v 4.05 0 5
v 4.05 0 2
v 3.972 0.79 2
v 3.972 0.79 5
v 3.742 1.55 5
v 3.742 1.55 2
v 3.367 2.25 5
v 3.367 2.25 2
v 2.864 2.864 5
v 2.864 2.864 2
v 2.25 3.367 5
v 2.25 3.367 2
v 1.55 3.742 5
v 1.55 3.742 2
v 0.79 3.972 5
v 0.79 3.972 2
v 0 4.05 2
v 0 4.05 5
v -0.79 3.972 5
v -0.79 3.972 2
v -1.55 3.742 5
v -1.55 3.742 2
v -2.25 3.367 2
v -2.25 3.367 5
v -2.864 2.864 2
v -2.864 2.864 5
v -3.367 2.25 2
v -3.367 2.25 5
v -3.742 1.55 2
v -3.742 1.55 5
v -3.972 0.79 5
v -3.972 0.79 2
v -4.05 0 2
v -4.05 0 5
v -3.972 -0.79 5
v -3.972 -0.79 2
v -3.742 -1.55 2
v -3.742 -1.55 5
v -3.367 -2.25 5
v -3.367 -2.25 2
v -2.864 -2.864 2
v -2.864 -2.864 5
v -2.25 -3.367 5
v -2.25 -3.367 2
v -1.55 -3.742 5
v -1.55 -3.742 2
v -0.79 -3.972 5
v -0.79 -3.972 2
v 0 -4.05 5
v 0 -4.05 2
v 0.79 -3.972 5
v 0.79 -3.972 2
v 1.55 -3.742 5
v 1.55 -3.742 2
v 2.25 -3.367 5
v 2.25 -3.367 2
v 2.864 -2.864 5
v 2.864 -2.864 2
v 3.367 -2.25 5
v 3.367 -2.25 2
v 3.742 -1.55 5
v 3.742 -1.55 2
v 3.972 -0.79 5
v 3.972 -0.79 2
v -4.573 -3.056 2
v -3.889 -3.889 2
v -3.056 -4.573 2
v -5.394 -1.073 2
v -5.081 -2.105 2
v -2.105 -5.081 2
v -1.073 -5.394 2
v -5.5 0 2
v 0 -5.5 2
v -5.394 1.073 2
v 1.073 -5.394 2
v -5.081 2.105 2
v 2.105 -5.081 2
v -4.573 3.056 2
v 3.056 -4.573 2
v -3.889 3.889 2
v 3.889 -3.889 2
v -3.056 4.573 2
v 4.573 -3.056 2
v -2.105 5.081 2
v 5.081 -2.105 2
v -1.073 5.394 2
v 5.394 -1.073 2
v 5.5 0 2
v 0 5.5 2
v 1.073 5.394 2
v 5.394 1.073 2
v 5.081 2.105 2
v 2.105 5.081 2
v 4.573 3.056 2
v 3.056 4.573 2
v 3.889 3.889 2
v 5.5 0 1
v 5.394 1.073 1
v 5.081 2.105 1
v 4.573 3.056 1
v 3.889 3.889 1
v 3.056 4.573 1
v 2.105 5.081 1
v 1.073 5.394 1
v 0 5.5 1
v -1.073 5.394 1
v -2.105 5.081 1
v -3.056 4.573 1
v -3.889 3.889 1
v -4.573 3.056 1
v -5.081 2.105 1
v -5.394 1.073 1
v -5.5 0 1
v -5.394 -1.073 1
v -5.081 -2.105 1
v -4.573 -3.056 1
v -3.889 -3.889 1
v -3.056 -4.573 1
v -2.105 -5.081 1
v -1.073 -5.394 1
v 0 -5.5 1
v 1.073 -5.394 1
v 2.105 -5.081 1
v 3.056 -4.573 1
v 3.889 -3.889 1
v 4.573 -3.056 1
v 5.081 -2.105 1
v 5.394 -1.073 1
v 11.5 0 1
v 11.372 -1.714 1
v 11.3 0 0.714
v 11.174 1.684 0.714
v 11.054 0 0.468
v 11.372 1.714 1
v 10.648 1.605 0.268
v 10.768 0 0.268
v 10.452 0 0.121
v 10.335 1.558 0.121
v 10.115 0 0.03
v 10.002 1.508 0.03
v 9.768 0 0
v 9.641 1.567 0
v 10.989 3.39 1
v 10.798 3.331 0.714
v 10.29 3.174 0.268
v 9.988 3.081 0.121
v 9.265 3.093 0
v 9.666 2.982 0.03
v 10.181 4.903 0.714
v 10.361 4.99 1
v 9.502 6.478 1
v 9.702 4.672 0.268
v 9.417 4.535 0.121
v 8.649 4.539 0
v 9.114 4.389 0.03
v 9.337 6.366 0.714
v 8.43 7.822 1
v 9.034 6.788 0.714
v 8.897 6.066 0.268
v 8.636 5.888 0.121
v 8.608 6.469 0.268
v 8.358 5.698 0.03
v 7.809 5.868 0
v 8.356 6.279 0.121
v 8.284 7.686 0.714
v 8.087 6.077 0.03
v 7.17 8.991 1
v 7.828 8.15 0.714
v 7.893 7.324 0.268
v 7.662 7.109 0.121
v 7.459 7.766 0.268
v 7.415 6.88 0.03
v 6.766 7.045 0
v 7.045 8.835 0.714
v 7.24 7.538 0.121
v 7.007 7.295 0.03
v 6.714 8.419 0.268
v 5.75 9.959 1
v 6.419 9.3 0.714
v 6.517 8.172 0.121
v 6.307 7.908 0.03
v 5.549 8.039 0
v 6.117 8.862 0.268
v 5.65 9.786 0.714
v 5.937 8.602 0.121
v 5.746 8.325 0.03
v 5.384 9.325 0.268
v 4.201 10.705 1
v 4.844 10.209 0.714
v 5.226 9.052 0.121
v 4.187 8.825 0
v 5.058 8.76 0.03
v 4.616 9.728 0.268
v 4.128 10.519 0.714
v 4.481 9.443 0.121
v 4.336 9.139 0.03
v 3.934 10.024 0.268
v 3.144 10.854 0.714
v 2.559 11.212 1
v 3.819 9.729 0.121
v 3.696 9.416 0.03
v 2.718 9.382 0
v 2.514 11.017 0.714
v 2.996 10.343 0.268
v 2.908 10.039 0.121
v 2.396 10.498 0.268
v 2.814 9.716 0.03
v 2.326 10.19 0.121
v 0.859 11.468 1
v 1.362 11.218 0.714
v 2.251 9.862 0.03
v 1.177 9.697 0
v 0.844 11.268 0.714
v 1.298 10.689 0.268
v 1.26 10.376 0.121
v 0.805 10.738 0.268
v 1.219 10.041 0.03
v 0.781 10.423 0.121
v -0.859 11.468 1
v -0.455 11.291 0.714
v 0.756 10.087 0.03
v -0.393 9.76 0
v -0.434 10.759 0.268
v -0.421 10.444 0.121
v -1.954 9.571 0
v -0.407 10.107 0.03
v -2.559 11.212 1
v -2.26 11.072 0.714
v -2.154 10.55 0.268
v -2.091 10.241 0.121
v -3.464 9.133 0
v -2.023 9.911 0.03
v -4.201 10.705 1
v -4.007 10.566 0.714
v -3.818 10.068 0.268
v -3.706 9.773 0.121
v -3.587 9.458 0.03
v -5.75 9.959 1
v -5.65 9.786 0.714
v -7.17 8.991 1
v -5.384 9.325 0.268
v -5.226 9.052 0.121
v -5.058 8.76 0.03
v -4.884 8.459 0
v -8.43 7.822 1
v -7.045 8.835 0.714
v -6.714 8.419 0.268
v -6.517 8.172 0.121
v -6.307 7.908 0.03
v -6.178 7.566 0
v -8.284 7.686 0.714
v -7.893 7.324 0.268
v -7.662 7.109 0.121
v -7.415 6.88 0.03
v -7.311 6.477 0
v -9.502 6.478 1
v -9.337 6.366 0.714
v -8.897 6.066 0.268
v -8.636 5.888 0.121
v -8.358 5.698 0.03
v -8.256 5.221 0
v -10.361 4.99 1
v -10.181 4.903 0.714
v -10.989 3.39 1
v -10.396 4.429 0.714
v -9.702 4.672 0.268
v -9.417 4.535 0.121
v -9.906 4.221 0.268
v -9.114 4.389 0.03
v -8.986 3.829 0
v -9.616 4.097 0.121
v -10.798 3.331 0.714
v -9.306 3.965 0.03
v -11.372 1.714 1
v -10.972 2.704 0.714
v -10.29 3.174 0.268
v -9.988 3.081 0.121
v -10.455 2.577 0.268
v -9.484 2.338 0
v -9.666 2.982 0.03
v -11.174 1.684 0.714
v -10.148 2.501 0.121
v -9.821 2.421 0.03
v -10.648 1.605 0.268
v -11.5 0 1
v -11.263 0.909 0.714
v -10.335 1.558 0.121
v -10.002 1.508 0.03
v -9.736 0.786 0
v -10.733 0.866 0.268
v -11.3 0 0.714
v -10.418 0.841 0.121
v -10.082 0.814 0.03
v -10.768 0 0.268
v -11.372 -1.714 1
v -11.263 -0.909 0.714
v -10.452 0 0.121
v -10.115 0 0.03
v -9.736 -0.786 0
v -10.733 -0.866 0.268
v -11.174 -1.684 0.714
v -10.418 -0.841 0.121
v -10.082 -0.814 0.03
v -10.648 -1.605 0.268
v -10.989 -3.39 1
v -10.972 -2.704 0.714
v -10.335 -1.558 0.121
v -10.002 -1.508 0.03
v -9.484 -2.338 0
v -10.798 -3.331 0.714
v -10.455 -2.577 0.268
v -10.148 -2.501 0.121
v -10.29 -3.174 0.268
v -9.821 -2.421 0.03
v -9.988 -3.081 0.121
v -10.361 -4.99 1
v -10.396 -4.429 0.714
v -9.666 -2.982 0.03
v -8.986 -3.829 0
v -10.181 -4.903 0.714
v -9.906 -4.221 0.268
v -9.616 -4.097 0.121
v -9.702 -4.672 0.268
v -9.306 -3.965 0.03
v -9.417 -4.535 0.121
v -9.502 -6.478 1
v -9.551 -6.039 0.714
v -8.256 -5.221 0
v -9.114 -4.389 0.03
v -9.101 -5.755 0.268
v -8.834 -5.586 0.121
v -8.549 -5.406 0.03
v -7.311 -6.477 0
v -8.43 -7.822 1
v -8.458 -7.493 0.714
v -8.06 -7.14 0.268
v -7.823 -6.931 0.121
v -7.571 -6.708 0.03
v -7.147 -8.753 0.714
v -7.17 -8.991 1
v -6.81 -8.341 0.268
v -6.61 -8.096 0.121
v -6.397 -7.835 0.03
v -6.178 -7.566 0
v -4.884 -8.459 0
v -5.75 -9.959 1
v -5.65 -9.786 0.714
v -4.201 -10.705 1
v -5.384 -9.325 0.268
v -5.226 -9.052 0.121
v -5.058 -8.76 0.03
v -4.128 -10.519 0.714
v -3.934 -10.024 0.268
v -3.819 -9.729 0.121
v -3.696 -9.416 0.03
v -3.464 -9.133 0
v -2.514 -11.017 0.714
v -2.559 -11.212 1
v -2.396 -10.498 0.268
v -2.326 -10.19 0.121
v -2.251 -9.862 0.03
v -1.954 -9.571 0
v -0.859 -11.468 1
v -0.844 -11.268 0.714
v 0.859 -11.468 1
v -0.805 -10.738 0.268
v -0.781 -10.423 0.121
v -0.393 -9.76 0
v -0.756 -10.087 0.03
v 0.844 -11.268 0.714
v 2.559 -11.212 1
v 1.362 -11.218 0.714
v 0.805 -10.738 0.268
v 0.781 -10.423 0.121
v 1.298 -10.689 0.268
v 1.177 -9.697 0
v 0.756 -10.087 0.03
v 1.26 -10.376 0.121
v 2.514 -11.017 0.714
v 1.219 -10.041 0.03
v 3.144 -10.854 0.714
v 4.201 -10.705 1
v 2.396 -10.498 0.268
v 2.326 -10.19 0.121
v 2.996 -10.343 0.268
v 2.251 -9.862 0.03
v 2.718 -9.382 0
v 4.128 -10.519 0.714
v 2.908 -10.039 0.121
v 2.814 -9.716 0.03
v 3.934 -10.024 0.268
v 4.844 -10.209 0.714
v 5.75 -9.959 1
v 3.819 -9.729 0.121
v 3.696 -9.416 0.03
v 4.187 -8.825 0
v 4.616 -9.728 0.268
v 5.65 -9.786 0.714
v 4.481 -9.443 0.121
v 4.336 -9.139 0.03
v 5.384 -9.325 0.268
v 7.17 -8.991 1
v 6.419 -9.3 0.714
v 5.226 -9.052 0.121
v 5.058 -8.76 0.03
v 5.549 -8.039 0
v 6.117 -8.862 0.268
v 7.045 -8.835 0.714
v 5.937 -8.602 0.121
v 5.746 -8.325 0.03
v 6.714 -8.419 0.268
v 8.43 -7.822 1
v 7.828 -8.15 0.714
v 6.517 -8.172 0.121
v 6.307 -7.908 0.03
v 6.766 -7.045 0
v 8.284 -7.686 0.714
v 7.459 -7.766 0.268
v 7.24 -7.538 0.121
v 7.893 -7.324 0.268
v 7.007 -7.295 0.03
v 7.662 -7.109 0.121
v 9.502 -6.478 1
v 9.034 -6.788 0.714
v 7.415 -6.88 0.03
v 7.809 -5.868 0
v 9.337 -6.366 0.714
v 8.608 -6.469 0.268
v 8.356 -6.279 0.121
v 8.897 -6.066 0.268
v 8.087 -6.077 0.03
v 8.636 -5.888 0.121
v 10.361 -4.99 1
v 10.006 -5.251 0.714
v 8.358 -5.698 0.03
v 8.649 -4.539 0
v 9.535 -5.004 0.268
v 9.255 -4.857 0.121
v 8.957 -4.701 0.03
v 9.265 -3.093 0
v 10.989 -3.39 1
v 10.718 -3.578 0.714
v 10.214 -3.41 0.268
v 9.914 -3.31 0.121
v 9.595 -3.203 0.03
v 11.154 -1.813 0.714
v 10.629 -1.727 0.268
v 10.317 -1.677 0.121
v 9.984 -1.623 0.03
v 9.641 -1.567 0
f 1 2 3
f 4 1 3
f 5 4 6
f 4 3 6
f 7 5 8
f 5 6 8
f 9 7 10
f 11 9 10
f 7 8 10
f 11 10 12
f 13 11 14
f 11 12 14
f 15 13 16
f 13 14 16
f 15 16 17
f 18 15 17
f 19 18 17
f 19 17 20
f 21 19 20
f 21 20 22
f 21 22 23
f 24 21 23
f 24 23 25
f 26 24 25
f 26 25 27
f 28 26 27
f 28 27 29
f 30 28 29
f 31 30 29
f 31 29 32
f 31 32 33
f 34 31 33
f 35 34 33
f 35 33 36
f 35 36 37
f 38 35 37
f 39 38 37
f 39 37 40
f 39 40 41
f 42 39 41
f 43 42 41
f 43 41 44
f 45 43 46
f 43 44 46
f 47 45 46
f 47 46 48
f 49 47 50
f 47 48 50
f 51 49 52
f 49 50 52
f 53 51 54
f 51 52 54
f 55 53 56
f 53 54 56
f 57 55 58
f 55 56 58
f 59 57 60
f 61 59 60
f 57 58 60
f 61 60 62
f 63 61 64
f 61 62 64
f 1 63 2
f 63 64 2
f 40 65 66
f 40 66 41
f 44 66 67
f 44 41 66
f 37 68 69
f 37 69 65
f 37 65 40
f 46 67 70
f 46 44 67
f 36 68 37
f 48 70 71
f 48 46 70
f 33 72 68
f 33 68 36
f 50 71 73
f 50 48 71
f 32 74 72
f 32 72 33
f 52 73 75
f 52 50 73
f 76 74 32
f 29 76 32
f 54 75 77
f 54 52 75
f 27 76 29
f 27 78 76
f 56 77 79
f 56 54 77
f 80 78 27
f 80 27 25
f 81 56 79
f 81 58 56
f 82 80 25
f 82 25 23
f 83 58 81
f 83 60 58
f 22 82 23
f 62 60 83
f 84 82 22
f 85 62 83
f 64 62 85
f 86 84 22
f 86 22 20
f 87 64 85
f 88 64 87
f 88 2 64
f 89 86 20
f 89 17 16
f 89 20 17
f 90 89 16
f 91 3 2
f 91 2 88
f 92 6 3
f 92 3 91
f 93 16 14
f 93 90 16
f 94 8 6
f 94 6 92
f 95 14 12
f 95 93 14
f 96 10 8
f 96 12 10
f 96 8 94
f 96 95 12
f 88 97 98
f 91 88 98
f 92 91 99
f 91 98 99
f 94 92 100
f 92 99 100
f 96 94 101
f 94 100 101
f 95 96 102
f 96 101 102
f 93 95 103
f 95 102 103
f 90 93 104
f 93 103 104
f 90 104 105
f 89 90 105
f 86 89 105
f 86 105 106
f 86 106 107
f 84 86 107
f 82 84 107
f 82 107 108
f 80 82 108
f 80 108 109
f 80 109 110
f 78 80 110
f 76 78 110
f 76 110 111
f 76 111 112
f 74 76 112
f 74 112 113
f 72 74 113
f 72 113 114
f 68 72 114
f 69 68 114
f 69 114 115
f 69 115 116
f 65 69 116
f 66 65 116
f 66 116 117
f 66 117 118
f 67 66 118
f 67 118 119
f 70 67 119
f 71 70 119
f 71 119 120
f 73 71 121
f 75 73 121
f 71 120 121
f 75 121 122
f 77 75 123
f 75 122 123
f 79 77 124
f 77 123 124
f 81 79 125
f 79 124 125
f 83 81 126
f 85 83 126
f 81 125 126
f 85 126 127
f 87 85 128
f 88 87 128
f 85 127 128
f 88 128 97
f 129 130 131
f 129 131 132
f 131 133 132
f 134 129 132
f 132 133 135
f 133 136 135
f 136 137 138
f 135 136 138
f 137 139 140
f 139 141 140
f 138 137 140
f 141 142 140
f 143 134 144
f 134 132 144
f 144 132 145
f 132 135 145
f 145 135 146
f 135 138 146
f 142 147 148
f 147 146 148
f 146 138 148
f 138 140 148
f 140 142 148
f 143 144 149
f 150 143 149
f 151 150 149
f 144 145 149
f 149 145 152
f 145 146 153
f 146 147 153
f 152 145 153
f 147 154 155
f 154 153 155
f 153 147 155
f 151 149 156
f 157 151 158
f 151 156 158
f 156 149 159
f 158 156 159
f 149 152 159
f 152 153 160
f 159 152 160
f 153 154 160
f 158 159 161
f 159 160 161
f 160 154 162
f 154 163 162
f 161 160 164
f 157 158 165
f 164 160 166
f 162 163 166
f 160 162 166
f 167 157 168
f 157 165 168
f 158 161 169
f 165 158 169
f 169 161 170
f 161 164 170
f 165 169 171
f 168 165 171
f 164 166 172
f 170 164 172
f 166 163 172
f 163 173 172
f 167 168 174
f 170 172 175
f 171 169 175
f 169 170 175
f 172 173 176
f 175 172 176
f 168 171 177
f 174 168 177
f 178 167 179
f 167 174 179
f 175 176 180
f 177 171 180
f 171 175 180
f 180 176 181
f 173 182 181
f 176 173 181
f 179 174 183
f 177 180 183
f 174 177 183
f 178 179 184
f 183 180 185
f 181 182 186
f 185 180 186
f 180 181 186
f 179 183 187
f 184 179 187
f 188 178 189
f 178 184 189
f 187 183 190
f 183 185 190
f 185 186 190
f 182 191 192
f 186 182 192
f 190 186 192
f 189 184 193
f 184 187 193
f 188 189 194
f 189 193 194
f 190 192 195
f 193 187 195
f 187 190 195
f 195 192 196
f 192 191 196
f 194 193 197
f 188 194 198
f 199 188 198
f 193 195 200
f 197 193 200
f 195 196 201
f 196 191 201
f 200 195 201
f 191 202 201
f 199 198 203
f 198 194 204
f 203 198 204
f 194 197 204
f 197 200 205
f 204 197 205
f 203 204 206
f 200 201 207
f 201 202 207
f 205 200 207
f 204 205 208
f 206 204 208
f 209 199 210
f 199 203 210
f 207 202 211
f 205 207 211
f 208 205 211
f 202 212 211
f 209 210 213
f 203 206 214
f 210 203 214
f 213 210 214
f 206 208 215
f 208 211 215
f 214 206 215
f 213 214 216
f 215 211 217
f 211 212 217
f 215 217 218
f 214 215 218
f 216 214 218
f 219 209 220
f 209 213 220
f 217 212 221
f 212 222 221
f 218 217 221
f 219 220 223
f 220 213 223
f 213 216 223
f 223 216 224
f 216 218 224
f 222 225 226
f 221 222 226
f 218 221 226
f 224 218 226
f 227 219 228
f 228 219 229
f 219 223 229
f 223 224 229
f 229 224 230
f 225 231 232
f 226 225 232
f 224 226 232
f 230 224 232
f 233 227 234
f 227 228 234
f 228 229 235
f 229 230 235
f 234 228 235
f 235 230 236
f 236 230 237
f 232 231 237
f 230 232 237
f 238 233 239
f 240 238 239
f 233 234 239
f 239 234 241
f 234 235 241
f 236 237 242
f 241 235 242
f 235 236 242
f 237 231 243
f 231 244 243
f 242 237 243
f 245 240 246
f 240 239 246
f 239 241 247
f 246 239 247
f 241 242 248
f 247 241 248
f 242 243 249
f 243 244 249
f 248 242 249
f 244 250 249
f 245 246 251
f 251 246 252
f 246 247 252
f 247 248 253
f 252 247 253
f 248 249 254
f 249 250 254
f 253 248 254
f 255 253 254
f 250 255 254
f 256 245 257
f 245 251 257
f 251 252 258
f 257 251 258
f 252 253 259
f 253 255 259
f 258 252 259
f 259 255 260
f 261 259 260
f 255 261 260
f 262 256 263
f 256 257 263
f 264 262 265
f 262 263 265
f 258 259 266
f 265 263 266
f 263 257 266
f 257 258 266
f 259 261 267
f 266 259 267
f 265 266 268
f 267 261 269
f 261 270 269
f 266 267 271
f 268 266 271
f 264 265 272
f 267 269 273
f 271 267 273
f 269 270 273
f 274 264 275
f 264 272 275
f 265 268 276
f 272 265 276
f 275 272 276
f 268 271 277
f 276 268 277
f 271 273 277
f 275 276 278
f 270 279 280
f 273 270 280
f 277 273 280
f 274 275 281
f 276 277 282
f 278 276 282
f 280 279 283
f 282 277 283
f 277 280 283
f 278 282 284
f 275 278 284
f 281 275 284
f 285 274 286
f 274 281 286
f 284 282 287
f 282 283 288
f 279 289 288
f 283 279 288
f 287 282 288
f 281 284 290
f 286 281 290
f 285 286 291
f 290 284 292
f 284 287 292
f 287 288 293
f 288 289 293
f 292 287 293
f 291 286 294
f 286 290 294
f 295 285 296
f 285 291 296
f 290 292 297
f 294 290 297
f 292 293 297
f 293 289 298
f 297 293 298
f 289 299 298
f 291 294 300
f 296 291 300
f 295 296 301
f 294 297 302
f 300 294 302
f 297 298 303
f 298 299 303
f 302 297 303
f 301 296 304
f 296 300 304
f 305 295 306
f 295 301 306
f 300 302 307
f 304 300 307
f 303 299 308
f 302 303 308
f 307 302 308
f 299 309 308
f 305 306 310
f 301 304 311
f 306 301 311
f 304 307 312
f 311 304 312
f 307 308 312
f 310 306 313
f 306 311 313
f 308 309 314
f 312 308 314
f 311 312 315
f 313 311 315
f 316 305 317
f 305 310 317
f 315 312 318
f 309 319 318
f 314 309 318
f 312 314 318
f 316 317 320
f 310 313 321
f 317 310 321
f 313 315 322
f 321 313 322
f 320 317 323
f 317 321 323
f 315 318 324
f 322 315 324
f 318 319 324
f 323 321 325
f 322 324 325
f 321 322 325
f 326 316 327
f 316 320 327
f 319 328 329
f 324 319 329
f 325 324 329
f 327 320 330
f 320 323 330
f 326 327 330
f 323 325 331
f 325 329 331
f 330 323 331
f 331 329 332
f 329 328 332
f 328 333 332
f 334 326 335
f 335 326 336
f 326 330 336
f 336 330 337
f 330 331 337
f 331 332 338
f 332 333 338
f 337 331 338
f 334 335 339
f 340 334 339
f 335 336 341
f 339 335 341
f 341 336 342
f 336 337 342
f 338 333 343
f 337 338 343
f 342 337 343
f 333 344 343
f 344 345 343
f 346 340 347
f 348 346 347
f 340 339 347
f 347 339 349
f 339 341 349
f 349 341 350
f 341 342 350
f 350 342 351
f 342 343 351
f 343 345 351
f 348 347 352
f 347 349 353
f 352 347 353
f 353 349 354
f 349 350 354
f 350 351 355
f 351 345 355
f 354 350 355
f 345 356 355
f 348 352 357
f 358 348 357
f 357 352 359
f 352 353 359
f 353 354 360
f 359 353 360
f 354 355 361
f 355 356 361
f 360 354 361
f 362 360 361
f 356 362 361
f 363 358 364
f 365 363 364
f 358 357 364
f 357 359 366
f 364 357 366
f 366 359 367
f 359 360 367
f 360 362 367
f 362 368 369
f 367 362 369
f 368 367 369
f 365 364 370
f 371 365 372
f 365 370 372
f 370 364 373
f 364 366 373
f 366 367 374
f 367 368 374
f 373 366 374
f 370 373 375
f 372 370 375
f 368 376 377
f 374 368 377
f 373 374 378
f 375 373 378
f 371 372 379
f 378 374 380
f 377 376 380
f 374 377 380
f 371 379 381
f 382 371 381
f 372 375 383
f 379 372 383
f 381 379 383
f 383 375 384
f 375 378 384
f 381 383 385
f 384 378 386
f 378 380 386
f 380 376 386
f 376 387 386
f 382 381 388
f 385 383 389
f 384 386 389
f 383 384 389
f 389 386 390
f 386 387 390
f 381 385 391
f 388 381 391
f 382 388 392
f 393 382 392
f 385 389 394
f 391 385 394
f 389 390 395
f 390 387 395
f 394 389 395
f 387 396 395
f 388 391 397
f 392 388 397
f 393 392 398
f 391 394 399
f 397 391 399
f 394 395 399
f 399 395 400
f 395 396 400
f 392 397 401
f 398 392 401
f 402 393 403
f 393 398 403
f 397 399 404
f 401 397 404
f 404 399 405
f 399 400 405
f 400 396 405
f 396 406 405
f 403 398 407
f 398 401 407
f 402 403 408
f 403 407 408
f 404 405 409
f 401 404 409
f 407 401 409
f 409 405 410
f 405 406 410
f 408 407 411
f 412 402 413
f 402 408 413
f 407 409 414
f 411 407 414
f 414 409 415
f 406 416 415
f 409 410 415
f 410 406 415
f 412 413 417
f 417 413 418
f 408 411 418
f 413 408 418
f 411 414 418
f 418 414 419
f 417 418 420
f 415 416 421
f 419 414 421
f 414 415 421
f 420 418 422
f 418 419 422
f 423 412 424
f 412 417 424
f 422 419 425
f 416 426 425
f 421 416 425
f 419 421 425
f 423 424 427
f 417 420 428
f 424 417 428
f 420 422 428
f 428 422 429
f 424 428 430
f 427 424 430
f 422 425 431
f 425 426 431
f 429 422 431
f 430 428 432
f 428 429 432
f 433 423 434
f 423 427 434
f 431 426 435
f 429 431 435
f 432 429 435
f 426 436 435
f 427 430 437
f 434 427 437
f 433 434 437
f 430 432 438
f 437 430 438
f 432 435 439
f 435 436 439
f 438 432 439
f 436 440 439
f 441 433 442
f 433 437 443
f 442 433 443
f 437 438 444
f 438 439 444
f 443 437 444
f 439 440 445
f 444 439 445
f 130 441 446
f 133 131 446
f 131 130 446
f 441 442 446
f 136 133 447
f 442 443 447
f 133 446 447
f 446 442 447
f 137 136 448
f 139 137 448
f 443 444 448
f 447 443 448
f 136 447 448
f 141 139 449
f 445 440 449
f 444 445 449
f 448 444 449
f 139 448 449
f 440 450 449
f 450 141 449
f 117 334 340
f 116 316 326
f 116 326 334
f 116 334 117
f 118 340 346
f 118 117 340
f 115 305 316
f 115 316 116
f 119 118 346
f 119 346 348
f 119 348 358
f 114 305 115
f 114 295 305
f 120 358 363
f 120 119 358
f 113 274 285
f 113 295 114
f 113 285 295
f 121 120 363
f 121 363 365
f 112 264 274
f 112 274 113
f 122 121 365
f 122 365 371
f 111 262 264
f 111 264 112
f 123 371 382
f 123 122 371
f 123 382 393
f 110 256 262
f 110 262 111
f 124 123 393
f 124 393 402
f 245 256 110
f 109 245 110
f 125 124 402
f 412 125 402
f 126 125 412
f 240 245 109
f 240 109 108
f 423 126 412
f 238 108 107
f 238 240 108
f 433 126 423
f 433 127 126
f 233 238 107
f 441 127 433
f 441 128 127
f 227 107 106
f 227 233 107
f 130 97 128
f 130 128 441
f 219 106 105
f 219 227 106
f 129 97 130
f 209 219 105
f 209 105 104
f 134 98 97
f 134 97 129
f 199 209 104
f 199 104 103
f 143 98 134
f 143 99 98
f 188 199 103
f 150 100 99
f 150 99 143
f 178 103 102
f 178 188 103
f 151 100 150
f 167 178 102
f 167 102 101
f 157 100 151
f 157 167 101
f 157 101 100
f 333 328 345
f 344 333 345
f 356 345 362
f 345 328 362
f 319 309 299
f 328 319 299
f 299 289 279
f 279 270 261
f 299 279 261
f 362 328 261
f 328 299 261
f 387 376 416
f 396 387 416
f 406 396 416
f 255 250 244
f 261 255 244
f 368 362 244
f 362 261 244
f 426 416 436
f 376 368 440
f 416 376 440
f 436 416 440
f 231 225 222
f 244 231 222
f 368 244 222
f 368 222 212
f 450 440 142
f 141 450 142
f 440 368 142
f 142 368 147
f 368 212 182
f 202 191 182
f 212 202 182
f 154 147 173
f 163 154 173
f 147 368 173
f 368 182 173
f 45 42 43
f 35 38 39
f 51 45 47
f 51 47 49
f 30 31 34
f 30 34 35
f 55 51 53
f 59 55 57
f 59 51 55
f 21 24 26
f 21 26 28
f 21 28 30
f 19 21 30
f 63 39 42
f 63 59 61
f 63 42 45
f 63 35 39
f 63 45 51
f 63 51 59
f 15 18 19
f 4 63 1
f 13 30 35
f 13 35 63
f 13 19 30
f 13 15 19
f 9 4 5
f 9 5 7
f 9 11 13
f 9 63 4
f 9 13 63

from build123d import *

# Parameters (mm, degrees)
F0_R     = 11.5
F0_R_2   = 5.5
F1_DEPTH = 1
F0_R_3   = 4.05
F2_DEPTH = 2
F0_R_4   = 2
F3_DEPTH = 5


# Not quite as in the source:
# - a fillet or chamfer that OpenCascade refuses, or shapes differently, is made with other operations: its cross-section is extruded or revolved along the edge and cut away or added


with BuildPart() as f1:
    # F0 (on Top) → F1 (new body)
    with BuildSketch(Plane.XY):
        Circle(F0_R)
        Circle(F0_R_2, mode=Mode.SUBTRACT)
    extrude(amount=F1_DEPTH)

    # F0 (on Top) → F2 (join)
    with BuildSketch(Plane.XY):
        Circle(F0_R_2)
        Circle(F0_R_3, mode=Mode.SUBTRACT)
    extrude(amount=F2_DEPTH)

    # F0 (on Top) → F3 (join)
    with BuildSketch(Plane.XY):
        Circle(F0_R_3)
        Circle(F0_R_4, mode=Mode.SUBTRACT)
        Circle(F0_R_4)
    extrude(amount=F3_DEPTH)

    # F4: fillet of radius 2 on 1 edges, made by hand

    # F4_s1 → F4_t2 (revolve, cut)
    with BuildSketch(Plane.XZ):
        with BuildLine():
            ThreePointArc((11.5, 1), (10.7679491924, 0.2679491924), (9.7679491924, 0))
            Line((9.7679491924, 0), (11.5, 0))
            Line((11.5, 0), (11.5, 1))
        make_face()
    revolve(axis=Axis((0, 0, 0), (0, 0, 1)), mode=Mode.SUBTRACT)


solid = f1.part
